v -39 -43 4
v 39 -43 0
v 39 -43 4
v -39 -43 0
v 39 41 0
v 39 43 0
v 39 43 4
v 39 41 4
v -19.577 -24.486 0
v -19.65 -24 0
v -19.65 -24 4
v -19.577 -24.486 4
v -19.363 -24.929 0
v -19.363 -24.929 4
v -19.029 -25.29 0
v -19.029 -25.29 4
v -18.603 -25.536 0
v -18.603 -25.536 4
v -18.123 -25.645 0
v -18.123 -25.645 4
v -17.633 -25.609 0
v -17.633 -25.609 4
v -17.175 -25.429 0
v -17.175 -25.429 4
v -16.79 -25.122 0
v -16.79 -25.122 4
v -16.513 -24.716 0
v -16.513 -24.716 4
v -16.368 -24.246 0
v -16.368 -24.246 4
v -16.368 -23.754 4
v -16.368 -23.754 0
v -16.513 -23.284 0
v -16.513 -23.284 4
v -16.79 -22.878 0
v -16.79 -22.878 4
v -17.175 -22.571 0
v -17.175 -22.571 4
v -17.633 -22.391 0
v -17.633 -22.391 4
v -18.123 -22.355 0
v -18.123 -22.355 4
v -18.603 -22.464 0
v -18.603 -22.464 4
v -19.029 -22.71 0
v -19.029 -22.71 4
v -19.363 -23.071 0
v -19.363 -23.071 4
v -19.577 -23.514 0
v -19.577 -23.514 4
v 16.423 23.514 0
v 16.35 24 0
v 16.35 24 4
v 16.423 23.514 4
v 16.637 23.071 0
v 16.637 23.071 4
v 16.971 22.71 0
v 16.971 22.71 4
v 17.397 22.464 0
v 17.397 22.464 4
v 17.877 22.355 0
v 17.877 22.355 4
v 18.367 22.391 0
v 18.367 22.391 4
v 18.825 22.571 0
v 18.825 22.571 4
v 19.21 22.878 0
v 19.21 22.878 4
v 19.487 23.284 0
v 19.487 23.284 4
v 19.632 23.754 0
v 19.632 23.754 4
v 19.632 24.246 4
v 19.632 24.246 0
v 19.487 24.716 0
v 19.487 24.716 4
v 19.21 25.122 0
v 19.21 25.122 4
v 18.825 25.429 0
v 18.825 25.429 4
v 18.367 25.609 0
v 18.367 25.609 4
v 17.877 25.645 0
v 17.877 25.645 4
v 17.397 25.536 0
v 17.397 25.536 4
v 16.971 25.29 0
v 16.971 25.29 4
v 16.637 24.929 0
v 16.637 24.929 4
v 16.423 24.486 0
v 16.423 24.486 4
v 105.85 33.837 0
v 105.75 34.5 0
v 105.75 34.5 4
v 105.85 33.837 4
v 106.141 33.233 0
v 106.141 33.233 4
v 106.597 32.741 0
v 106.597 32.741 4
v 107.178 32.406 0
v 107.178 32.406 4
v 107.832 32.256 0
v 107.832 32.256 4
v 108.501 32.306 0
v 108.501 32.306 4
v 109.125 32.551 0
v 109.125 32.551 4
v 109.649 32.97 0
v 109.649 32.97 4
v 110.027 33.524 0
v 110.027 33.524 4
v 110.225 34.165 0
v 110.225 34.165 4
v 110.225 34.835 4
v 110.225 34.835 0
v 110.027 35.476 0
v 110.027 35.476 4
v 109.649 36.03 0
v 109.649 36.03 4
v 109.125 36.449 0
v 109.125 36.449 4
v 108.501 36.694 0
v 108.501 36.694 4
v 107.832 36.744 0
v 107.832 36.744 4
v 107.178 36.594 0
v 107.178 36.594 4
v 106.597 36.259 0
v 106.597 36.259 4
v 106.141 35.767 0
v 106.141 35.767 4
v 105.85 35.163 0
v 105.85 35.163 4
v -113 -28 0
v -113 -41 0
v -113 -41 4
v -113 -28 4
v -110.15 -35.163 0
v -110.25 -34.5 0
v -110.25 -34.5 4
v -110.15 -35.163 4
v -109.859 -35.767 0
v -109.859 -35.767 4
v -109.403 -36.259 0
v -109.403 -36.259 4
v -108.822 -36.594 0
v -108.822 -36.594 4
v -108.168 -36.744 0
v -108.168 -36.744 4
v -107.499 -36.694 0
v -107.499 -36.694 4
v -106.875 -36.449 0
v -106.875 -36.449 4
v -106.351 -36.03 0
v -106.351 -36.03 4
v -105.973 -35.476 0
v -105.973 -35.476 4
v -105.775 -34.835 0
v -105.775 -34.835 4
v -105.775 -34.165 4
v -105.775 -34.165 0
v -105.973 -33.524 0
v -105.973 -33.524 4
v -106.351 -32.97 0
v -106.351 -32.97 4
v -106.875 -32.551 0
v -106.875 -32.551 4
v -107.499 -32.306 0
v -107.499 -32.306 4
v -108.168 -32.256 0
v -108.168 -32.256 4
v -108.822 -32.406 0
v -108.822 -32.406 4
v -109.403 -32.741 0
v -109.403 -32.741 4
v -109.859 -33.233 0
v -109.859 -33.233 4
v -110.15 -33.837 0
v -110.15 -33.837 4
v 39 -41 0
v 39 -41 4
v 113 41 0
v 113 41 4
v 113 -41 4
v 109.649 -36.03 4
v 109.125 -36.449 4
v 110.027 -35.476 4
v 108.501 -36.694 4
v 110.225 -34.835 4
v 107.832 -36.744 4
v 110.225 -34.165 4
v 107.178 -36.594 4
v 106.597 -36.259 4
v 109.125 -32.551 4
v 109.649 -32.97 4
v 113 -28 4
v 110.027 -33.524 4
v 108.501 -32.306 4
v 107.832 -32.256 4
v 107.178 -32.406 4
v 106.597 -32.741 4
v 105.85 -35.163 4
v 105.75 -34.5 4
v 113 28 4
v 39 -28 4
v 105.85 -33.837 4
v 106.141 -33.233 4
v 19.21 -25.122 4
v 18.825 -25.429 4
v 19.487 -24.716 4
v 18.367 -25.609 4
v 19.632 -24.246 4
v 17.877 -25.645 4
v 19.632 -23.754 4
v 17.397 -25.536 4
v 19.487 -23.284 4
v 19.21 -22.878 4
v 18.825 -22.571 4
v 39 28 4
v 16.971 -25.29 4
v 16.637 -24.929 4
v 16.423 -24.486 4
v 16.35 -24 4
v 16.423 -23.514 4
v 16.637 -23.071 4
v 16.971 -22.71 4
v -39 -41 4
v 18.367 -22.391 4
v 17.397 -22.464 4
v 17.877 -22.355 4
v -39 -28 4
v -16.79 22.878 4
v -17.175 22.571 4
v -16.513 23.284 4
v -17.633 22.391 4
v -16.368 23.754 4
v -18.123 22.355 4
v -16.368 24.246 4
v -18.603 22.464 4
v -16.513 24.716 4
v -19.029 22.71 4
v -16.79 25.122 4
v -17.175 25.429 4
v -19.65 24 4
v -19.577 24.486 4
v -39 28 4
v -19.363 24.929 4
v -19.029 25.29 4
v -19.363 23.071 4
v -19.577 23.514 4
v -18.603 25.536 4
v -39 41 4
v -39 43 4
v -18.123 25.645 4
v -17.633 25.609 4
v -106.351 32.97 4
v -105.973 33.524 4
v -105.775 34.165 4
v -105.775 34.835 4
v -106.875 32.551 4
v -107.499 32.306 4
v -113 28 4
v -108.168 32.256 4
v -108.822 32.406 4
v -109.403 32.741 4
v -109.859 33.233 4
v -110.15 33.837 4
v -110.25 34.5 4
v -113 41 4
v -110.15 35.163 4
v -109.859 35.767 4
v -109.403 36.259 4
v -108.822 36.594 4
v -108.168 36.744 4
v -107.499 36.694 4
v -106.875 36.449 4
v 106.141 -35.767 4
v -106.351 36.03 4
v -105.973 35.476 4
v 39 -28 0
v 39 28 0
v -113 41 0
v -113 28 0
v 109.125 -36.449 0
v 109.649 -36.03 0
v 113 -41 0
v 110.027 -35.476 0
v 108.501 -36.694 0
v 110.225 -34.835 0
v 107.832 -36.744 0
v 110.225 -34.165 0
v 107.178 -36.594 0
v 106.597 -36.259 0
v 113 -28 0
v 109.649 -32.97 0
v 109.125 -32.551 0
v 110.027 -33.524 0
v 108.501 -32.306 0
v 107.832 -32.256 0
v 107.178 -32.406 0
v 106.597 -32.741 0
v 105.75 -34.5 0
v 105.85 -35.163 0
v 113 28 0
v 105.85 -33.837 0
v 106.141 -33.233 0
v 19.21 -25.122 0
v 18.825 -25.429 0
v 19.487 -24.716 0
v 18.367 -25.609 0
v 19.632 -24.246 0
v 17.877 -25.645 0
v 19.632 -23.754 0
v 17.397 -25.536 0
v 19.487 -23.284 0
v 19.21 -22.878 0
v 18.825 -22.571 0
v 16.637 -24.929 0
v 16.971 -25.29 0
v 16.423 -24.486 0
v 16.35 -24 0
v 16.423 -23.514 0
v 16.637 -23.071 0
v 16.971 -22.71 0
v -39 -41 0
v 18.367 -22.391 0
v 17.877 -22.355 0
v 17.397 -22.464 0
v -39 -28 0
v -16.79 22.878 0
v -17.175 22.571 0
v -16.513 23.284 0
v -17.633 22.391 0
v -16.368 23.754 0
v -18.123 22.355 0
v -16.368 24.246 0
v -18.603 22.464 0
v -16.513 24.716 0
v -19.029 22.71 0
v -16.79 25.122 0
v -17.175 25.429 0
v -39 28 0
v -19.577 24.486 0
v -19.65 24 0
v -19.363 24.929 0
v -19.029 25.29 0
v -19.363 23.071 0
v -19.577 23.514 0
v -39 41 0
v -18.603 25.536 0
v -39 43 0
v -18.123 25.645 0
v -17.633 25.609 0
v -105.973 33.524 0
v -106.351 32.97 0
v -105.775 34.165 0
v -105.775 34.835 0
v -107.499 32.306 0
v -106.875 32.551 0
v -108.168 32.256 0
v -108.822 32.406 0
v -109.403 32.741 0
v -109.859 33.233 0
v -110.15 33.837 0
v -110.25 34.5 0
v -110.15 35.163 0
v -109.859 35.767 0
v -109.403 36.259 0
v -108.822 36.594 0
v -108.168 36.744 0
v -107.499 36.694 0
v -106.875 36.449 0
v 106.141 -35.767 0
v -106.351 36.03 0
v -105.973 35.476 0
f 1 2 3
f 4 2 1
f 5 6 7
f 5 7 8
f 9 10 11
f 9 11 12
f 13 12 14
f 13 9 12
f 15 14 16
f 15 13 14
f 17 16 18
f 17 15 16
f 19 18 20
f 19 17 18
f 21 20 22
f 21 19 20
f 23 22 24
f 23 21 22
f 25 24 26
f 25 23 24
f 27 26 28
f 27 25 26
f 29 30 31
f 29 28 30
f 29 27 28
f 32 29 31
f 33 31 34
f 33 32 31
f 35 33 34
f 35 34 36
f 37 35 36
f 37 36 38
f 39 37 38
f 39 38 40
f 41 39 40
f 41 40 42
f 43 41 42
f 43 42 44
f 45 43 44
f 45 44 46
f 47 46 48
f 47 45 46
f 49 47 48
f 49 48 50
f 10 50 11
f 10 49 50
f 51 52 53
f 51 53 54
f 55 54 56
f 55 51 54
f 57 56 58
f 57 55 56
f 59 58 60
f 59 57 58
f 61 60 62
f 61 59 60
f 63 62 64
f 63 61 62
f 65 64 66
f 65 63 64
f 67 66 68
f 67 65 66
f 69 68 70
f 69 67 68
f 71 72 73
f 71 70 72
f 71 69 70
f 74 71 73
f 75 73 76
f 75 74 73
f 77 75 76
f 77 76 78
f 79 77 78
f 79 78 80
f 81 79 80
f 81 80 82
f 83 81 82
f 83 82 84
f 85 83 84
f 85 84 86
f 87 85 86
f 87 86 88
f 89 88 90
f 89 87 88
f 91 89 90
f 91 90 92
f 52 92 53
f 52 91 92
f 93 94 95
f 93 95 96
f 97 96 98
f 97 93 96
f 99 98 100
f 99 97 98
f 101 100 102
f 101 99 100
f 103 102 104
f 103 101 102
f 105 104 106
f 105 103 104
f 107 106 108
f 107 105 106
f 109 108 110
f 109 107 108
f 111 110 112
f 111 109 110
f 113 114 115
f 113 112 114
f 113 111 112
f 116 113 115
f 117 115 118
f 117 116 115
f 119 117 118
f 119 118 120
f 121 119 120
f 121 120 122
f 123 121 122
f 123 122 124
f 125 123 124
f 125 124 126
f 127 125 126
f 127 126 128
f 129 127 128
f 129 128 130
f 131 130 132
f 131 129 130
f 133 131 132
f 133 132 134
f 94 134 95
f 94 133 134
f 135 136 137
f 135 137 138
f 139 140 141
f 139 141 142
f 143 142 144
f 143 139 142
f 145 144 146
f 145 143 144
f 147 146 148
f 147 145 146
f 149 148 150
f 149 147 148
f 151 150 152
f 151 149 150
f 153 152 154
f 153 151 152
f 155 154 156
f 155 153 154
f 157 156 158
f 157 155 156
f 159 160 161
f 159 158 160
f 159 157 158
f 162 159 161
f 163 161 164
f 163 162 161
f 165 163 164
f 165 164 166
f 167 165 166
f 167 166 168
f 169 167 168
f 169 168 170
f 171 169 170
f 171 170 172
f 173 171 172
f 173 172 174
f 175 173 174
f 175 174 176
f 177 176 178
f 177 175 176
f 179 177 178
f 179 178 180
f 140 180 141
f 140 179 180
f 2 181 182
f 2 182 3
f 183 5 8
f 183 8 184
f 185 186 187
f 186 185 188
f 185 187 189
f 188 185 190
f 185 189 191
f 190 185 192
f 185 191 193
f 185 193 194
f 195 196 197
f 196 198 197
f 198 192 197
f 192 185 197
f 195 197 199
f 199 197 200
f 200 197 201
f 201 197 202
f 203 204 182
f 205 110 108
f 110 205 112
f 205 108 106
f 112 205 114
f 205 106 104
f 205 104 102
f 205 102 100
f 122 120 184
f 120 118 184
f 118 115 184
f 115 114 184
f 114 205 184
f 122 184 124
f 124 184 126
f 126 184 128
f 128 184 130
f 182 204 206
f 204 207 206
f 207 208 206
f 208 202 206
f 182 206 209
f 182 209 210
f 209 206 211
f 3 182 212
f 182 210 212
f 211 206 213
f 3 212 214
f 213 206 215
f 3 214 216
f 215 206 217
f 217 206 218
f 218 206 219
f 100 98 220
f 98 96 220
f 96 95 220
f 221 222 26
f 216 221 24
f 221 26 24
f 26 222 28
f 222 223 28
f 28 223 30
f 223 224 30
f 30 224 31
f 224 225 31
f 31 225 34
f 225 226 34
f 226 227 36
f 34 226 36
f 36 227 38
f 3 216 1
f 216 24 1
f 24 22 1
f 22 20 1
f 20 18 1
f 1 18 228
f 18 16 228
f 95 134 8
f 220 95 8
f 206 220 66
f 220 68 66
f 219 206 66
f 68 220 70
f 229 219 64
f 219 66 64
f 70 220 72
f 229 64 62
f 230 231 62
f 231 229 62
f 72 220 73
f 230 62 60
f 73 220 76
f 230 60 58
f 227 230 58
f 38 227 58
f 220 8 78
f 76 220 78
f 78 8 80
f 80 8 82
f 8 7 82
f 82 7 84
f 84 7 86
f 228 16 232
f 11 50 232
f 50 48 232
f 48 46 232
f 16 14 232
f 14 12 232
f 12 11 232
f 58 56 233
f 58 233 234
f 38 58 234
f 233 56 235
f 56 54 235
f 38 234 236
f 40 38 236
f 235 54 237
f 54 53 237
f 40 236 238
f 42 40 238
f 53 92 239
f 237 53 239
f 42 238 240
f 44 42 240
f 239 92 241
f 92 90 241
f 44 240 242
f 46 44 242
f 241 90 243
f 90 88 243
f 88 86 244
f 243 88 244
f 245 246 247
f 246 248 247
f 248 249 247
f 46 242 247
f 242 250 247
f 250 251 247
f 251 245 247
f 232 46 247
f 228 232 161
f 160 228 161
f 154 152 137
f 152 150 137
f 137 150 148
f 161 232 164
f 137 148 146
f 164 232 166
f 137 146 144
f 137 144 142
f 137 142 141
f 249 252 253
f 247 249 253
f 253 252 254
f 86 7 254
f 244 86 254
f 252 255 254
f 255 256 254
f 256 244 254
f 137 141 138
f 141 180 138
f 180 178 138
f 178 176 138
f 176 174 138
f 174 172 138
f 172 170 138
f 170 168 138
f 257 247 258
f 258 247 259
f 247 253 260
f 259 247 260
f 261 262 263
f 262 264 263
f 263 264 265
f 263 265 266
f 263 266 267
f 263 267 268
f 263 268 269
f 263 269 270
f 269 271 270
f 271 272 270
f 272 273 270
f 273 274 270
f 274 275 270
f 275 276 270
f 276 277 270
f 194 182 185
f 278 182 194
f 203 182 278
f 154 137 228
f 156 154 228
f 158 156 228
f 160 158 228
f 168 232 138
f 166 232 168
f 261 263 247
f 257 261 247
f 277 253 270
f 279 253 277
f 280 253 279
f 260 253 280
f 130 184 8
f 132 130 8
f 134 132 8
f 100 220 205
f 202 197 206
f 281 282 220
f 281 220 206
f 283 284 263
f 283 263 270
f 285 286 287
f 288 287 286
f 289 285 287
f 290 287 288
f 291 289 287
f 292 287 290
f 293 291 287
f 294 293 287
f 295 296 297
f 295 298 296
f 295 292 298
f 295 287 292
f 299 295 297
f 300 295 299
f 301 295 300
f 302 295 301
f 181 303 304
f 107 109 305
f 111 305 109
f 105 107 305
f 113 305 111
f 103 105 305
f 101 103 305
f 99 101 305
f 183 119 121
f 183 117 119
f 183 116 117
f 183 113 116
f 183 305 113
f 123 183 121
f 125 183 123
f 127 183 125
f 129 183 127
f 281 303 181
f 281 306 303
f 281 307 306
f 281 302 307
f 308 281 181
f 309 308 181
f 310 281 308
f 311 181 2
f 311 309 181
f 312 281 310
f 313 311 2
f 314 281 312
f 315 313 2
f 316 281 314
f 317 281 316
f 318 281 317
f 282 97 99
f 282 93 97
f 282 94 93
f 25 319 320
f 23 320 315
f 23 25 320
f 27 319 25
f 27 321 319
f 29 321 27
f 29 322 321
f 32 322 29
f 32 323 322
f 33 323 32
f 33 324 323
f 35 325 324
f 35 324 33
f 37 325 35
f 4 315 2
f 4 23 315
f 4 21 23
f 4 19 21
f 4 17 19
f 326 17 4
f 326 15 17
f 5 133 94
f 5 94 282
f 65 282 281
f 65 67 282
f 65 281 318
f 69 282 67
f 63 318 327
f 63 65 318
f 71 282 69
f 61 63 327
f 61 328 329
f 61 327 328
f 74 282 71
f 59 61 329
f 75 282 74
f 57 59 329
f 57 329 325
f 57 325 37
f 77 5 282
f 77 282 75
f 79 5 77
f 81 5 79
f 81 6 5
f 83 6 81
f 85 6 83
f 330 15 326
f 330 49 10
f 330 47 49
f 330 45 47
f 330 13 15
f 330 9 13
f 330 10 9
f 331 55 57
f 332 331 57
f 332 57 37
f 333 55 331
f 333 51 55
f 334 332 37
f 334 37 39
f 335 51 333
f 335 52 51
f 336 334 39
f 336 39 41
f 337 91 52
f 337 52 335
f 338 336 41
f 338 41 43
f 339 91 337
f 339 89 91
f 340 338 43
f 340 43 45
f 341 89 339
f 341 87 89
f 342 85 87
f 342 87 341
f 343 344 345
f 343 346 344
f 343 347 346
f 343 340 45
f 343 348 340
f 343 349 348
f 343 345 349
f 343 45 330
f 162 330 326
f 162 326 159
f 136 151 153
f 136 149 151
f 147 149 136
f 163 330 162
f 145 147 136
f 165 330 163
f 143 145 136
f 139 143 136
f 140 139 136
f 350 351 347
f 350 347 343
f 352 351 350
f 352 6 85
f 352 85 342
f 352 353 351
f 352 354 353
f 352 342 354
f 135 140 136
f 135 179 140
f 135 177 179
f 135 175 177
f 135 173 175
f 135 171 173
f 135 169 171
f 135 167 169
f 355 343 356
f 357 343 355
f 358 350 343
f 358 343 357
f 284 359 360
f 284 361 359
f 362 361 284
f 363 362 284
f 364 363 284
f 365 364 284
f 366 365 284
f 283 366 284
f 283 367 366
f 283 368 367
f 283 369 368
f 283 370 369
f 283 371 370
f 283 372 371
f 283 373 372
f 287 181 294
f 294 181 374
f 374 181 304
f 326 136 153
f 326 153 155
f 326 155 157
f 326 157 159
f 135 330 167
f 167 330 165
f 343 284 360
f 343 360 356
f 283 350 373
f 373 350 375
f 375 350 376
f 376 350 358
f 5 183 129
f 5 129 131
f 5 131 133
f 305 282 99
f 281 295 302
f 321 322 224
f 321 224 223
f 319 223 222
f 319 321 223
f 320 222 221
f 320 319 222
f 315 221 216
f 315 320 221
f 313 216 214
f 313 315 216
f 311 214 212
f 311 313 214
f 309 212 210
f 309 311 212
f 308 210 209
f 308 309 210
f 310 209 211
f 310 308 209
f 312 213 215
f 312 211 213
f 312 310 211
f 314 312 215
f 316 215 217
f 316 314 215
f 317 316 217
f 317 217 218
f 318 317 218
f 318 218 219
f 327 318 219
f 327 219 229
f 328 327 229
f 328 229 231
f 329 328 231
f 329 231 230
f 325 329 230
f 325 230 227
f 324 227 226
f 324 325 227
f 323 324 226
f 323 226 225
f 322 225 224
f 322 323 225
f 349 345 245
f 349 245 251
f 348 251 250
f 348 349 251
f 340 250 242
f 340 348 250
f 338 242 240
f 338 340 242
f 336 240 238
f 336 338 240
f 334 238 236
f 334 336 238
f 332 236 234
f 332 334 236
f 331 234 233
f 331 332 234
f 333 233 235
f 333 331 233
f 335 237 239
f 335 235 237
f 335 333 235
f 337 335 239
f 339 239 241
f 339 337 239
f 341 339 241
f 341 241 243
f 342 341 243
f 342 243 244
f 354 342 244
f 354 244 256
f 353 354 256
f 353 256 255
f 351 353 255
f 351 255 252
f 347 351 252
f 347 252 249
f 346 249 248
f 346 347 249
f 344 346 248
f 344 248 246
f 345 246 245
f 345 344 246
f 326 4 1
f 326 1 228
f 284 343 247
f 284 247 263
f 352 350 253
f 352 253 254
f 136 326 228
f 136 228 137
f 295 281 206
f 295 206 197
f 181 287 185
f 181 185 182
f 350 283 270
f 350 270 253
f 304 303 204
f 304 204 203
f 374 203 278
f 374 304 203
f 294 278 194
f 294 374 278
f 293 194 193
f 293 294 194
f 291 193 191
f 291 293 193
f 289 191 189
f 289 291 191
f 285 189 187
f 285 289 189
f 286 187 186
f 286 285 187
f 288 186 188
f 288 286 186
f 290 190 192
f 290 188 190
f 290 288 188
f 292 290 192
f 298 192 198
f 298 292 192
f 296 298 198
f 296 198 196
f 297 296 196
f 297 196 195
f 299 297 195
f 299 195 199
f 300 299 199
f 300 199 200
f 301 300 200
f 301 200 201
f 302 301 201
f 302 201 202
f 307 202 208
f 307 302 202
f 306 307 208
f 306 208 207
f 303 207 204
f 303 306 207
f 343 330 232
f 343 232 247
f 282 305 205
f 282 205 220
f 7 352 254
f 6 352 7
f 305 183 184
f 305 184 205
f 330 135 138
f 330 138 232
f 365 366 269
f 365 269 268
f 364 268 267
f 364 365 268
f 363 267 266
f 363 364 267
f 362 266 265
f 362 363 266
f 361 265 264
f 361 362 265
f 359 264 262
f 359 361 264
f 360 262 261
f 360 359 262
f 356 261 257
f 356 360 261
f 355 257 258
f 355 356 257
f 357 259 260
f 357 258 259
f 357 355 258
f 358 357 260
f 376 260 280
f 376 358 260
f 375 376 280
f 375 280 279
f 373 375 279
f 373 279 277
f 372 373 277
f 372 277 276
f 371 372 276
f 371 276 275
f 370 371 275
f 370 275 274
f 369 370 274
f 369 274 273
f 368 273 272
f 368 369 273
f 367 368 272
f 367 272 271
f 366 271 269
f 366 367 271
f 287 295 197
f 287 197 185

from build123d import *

# Parameters (mm, degrees)
SENSOR_BRIDGE_DEPTH      = 4
DECK_COLUMNS_M4_START    = -1
SKETCH_DECK_COLUMNS_M4_R = 2.25
DECK_COLUMNS_M4_DEPTH    = 6
MID360_MOUNT_START       = -1
SKETCH_MID360_MOUNT_R    = 1.65
MID360_MOUNT_DEPTH       = 6


with BuildPart() as part:
    # Sketch_Sensor_bridge → Sensor_bridge (new body)
    with BuildSketch(Plane.XY):
        Polygon((113, -28), (113, -41), (39, -41), (39, -43), (-39, -43), (-39, -41), (-113, -41), (-113, -28), (-39, -28), (-39, 28), (-113, 28), (-113, 41), (-39, 41), (-39, 43), (39, 43), (39, 41), (113, 41), (113, 28), (39, 28), (39, -28), align=None)
    extrude(amount=SENSOR_BRIDGE_DEPTH)

    # Sketch_Deck_columns_M4 → Deck_columns_M4 (cut)
    with BuildSketch(Plane.XY.offset(DECK_COLUMNS_M4_START)):
        with Locations(Location((-108, -34.5, 0), (0, 0, 180))):
            Circle(SKETCH_DECK_COLUMNS_M4_R)
        with Locations(Location((-108, 34.5, 0), (0, 0, 180))):
            Circle(SKETCH_DECK_COLUMNS_M4_R)
        with Locations(Location((108, -34.5, 0), (0, 0, 180))):
            Circle(SKETCH_DECK_COLUMNS_M4_R)
        with Locations(Location((108, 34.5, 0), (0, 0, 180))):
            Circle(SKETCH_DECK_COLUMNS_M4_R)
    extrude(amount=DECK_COLUMNS_M4_DEPTH, mode=Mode.SUBTRACT)

    # Sketch_MID360_mount → MID360_mount (cut)
    with BuildSketch(Plane.XY.offset(MID360_MOUNT_START)):
        with Locations(Location((-18, -24, 0), (0, 0, 180))):
            Circle(SKETCH_MID360_MOUNT_R)
        with Locations(Location((-18, 24, 0), (0, 0, 180))):
            Circle(SKETCH_MID360_MOUNT_R)
        with Locations(Location((18, -24, 0), (0, 0, 180))):
            Circle(SKETCH_MID360_MOUNT_R)
        with Locations(Location((18, 24, 0), (0, 0, 180))):
            Circle(SKETCH_MID360_MOUNT_R)
    extrude(amount=MID360_MOUNT_DEPTH, mode=Mode.SUBTRACT)


solid = part.part
